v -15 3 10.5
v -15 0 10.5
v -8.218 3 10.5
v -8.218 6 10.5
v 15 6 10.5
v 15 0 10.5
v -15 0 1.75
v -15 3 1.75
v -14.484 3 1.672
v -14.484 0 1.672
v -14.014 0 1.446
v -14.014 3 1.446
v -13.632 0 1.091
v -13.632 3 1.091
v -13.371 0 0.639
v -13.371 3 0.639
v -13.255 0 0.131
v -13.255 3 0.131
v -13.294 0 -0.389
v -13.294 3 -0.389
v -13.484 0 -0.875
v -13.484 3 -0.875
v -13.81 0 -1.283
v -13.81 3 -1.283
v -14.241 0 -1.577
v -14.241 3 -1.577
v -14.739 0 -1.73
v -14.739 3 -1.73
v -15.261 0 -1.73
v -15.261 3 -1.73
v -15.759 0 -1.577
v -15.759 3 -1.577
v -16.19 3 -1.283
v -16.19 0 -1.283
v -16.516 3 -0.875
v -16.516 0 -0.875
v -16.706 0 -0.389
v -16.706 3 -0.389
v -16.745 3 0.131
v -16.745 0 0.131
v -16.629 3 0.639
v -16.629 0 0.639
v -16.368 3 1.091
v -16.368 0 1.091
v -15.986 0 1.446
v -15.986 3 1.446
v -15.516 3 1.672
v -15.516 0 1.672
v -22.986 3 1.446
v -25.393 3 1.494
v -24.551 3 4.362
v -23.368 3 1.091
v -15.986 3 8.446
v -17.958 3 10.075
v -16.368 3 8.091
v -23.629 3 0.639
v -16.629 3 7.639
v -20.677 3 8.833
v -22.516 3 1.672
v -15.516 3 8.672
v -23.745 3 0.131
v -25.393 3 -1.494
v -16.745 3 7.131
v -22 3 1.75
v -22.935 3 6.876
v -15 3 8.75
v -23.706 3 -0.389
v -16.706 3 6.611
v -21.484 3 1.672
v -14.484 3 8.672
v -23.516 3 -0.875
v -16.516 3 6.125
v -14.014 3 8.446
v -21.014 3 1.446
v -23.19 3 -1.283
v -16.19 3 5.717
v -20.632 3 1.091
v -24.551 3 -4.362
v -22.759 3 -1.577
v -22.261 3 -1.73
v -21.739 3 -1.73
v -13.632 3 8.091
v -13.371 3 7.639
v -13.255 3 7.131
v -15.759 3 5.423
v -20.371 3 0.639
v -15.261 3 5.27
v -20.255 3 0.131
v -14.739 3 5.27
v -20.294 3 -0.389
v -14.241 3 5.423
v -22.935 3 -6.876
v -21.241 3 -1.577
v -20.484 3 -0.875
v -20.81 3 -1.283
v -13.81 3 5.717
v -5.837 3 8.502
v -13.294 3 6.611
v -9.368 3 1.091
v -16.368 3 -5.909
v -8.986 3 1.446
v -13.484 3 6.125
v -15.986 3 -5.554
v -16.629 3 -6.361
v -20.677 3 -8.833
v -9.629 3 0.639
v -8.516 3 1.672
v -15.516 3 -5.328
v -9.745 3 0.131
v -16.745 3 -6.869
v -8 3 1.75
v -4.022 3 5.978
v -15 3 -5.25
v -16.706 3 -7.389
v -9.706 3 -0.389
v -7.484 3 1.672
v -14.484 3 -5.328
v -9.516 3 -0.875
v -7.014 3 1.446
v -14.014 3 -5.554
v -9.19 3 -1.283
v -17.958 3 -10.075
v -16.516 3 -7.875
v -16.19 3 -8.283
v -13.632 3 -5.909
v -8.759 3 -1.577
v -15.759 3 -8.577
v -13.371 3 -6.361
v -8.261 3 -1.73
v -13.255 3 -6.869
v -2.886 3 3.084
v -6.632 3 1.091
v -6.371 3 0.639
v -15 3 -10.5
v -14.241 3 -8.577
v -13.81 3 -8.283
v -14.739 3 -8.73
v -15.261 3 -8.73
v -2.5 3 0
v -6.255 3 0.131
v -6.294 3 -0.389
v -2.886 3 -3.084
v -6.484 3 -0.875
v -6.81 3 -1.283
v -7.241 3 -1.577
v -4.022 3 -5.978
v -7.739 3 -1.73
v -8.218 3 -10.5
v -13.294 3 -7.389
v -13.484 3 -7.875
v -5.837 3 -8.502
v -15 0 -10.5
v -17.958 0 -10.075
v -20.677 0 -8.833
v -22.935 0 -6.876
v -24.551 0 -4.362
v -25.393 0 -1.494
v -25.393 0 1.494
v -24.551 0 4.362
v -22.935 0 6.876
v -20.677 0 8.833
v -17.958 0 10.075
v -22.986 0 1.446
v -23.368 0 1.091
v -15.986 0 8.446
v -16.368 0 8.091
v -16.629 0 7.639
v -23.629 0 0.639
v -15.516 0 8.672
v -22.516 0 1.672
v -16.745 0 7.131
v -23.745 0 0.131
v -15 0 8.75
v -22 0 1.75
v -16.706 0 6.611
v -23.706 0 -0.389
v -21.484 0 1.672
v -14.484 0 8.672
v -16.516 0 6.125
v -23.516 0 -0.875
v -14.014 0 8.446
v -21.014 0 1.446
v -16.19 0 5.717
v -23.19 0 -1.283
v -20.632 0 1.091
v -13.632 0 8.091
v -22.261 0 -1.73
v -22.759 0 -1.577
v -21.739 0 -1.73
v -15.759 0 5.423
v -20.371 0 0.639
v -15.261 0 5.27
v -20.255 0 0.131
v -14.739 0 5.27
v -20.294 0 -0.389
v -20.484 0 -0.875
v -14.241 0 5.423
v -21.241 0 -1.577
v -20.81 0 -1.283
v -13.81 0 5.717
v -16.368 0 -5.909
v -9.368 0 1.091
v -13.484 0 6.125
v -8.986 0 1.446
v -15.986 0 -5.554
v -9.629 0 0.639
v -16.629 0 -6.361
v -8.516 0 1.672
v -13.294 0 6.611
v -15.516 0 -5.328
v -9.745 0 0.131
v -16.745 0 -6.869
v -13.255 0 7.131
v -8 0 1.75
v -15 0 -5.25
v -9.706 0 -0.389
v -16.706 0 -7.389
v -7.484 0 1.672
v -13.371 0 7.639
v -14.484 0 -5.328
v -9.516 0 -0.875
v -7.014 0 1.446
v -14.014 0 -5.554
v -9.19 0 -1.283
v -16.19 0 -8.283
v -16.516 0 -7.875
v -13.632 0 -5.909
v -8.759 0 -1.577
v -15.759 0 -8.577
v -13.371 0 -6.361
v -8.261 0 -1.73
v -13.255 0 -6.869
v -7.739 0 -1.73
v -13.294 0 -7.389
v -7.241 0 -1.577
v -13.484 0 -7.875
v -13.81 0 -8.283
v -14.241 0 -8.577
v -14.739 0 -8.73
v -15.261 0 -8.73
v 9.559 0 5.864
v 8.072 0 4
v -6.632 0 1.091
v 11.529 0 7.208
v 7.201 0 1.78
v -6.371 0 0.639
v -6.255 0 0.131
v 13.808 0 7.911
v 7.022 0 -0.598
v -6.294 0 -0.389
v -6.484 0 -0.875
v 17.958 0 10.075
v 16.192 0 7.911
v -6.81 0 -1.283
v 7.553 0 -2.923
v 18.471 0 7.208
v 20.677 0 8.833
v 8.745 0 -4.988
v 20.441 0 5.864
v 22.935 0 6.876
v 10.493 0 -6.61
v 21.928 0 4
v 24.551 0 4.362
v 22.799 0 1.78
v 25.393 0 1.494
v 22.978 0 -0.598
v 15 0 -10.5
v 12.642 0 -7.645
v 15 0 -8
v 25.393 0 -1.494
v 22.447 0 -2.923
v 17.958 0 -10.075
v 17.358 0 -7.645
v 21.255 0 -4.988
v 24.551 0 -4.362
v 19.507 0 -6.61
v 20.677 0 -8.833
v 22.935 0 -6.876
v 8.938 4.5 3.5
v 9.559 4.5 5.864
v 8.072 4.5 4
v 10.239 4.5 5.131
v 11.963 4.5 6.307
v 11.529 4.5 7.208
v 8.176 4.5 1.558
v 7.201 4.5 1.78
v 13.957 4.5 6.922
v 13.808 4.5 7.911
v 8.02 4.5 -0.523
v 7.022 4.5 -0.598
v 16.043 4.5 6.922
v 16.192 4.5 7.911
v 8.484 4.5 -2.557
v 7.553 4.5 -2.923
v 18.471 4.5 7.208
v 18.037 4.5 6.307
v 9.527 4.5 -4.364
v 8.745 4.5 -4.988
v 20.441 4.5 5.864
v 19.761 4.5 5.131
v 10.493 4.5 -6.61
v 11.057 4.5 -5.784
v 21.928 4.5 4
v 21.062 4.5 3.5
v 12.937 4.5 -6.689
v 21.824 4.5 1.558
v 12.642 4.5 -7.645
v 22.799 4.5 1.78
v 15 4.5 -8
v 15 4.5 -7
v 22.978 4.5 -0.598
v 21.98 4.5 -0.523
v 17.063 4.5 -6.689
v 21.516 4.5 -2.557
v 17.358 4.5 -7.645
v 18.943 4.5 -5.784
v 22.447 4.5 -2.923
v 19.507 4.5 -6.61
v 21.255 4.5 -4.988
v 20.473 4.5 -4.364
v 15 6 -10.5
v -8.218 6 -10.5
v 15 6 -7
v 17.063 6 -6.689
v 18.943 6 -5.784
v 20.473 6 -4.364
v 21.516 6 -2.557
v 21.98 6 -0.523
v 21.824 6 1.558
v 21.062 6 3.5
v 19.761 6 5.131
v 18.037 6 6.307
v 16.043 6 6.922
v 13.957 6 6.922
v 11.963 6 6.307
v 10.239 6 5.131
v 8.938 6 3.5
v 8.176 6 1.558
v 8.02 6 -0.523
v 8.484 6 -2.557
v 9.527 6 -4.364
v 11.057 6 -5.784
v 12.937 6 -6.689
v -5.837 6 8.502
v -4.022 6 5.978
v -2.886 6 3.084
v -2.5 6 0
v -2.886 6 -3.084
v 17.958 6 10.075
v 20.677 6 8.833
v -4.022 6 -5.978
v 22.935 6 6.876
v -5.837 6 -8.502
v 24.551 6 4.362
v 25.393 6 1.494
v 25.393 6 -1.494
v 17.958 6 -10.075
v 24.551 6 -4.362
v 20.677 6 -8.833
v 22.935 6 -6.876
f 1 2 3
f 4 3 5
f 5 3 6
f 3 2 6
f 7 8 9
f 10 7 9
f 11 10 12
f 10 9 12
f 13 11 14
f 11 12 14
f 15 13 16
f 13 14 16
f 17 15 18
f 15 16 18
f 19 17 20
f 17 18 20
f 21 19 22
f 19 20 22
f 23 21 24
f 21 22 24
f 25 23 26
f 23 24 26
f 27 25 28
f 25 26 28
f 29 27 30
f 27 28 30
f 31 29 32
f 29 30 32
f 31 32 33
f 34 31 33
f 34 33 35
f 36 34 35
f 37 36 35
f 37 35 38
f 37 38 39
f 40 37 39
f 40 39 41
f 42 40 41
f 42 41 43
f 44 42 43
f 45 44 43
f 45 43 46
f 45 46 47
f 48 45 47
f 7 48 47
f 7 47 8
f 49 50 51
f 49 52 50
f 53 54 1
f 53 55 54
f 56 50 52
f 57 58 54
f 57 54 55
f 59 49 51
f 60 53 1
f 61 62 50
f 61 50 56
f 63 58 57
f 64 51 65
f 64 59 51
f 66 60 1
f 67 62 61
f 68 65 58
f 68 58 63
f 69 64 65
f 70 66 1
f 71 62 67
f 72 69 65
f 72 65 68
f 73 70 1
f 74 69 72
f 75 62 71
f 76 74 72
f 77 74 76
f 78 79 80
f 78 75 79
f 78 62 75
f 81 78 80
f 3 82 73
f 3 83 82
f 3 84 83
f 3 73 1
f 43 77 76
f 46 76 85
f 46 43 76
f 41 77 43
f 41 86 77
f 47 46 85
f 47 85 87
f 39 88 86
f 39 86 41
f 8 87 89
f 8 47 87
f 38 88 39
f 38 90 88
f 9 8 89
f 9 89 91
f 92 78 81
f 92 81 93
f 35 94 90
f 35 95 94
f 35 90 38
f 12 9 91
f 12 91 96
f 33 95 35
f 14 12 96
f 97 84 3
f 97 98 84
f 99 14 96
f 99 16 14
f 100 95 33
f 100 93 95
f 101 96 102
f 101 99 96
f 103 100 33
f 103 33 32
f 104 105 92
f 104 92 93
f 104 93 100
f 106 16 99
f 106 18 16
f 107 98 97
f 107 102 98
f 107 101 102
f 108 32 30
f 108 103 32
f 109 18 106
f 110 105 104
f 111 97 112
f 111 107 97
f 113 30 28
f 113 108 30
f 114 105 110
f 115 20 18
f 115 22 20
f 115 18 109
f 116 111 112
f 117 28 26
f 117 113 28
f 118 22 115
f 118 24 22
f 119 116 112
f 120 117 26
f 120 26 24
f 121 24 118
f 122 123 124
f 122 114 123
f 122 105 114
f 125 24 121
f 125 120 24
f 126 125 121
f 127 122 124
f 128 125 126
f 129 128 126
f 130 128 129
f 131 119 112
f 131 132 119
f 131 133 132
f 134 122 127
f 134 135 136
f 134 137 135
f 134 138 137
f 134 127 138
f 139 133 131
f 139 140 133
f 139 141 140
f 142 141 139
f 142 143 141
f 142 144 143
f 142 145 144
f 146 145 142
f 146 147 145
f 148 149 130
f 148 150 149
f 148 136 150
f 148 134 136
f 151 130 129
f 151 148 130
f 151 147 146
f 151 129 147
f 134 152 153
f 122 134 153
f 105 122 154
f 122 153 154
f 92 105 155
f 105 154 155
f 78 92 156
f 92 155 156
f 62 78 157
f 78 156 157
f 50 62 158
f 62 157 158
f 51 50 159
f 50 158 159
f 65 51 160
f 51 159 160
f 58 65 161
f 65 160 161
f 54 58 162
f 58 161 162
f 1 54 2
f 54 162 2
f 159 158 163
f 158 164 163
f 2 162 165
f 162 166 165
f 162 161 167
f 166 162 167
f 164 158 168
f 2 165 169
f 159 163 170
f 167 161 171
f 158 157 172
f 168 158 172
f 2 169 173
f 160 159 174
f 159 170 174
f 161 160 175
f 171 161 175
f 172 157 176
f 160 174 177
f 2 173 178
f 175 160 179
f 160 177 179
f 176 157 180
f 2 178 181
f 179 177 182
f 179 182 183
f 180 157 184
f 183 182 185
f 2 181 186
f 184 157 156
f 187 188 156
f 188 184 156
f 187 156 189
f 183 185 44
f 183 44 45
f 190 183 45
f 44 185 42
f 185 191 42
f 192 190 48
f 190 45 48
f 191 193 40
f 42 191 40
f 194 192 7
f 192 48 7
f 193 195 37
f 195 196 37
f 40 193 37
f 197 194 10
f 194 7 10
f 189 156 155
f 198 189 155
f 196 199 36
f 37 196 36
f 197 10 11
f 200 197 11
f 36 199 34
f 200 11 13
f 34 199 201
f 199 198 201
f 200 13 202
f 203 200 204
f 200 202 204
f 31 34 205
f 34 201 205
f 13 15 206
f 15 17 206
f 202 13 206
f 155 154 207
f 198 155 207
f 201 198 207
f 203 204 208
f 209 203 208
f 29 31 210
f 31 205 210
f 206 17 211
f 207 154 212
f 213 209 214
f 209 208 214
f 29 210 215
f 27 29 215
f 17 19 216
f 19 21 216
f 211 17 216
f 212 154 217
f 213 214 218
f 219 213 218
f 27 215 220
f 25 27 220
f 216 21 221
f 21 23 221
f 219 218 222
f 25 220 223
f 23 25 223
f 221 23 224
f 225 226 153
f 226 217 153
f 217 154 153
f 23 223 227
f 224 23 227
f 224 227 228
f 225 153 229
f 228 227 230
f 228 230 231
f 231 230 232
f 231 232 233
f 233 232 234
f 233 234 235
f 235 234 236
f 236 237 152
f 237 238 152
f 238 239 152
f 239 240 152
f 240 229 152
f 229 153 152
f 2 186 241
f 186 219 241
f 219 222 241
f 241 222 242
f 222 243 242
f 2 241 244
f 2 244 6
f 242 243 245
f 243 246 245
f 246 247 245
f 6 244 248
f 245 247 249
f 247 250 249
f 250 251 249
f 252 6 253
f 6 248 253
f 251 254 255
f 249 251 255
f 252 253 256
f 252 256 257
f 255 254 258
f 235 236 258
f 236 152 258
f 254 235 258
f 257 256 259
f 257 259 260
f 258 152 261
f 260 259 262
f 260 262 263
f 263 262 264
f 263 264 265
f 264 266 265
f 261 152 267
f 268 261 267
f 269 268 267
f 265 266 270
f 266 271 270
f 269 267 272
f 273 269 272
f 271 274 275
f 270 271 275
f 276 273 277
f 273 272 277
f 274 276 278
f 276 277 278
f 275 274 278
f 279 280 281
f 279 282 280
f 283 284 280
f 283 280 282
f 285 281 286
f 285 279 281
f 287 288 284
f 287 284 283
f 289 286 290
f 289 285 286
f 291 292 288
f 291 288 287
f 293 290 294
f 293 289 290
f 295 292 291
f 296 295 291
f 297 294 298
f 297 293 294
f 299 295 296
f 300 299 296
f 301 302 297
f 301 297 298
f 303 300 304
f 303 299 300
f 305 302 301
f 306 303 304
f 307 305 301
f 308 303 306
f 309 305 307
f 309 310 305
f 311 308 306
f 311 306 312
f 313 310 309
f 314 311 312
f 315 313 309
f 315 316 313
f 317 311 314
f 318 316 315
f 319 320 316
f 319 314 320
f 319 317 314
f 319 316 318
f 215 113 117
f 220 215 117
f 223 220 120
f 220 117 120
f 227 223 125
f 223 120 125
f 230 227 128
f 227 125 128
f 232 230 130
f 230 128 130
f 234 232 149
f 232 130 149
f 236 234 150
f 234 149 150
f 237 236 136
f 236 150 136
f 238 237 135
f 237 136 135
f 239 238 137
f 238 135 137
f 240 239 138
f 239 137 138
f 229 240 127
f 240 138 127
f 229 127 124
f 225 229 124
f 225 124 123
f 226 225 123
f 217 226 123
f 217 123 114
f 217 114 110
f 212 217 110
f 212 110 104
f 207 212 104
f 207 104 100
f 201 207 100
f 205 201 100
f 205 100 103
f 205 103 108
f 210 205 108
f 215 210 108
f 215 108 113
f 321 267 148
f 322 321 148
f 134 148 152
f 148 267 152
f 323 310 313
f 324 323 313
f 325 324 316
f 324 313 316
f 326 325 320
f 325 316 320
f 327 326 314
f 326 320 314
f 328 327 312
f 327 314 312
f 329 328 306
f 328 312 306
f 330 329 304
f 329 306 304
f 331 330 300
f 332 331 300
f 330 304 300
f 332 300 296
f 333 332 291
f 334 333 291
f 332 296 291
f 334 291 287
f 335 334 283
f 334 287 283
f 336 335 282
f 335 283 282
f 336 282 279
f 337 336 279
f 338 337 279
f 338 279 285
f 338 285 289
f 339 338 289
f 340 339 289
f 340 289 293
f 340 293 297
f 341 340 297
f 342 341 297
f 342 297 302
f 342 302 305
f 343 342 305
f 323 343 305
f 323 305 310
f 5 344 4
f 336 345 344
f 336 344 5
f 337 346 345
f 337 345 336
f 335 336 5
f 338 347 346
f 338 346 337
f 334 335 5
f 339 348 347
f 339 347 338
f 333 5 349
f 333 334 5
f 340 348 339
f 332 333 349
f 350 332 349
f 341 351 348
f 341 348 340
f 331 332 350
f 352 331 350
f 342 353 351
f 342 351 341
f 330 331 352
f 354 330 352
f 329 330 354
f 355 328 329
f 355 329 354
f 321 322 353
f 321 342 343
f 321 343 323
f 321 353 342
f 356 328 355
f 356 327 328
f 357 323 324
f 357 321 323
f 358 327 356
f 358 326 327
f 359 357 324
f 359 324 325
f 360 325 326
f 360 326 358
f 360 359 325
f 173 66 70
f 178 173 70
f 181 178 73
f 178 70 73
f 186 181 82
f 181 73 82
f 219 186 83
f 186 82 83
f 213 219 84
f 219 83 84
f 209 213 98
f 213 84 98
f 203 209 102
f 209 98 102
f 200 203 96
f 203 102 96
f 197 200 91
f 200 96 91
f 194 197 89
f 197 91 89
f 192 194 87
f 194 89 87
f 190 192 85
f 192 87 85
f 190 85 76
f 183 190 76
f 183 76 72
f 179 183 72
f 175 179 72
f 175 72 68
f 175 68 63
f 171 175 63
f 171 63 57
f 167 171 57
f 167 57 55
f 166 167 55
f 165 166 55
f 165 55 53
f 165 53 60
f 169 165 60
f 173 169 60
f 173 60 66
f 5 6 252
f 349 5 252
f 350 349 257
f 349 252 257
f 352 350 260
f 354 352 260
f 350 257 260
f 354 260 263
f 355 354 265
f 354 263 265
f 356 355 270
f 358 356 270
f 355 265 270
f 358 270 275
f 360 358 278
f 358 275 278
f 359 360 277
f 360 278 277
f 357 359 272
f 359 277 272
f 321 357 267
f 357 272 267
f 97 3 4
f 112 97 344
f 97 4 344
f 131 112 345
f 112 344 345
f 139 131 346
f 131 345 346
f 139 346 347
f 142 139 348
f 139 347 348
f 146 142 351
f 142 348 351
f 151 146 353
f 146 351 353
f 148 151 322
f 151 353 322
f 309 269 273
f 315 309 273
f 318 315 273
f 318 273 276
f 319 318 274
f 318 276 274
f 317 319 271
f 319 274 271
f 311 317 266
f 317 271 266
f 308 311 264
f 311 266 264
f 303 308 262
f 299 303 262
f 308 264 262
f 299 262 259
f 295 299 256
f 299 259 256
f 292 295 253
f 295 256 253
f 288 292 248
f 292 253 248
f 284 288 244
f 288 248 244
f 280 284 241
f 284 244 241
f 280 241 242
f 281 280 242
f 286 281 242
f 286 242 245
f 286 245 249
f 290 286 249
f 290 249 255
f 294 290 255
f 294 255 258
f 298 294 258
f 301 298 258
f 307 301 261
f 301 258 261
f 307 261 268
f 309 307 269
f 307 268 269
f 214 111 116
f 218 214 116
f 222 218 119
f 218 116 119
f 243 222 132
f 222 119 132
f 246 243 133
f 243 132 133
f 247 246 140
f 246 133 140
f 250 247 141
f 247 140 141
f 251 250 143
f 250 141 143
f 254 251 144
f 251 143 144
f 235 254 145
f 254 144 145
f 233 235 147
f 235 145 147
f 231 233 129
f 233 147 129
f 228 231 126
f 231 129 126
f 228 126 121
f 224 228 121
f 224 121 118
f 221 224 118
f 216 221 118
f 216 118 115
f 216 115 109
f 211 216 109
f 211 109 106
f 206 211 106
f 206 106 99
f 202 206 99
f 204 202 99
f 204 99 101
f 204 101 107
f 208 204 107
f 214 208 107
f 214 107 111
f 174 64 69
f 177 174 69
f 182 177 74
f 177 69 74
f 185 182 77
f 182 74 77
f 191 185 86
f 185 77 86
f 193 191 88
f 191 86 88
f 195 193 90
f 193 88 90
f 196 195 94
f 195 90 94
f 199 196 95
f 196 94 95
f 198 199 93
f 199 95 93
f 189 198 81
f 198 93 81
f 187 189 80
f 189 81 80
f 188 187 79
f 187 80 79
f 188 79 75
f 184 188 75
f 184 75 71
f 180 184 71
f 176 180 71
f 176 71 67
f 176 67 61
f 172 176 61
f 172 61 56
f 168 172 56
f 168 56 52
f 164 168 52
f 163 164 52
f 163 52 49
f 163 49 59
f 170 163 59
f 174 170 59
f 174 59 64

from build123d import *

# Parameters (mm, degrees)
BOSS_EXTRUDE1_DEPTH     = 6
SKETCH4_R               = 1.75
SERVO_HORN_HOLES_DEPTH  = 29.222331583
SKETCH5_R               = 8
BEARING_PRESS_FIT_DEPTH = 4.5
SKETCH7_R               = 12.5
CUT_EXTRUDE1_DEPTH      = 3
SKETCH8_R               = 7
CUT_EXTRUDE2_DEPTH      = 28.941904015


with BuildPart() as part:
    # Sketch2 → Boss-Extrude1 (new body)
    with BuildSketch(Plane(origin=(0, 0, 0), x_dir=(1, 0, 0), z_dir=(0, 1, 0))):
        with BuildLine():
            Line((15, 10.5), (-15, 10.5))
            ThreePointArc((-15, 10.5), (-25.5, 0), (-15, -10.5))
            Line((-15, -10.5), (15, -10.5))
            ThreePointArc((15, -10.5), (25.5, 0), (15, 10.5))
        make_face()
    extrude(amount=BOSS_EXTRUDE1_DEPTH)

    # Sketch4 → Servo horn holes (cut, through all)
    with BuildSketch(Plane(origin=(0, 6, 0), x_dir=(1, 0, 0), z_dir=(0, 1, 0))):
        with Locations(Location((-15, 0, 0), (0, 0, 270))):
            Circle(SKETCH4_R)
        with Locations(Location((-8, 0, 0), (0, 0, 270))):
            Circle(SKETCH4_R)
        with Locations(Location((-15, -7, 0), (0, 0, 270))):
            Circle(SKETCH4_R)
        with Locations(Location((-22, 0, 0), (0, 0, 270))):
            Circle(SKETCH4_R)
        with Locations(Location((-15, 7, 0), (0, 0, 270))):
            Circle(SKETCH4_R)
    extrude(amount=-SERVO_HORN_HOLES_DEPTH, mode=Mode.SUBTRACT)

    # Sketch5 → Bearing press fit (cut)
    with BuildSketch(Plane(origin=(0, 0, 0), x_dir=(-1, 0, 0), z_dir=(0, -1, 0))):
        with Locations(Location((-15, 0, 0), (0, 0, 90))):
            Circle(SKETCH5_R)
    extrude(amount=-BEARING_PRESS_FIT_DEPTH, mode=Mode.SUBTRACT)

    # Sketch7 → Cut-Extrude1 (cut)
    with BuildSketch(Plane(origin=(0, 6, 0), x_dir=(1, 0, 0), z_dir=(0, 1, 0))):
        with Locations((-15, 0)):
            Circle(SKETCH7_R)
    extrude(amount=-CUT_EXTRUDE1_DEPTH, mode=Mode.SUBTRACT)

    # Sketch8 → Cut-Extrude2 (cut, through all)
    with BuildSketch(Plane.XZ.offset(-4.5)):
        with Locations(Location((15, 0, 0), (0, 0, 270))):
            Circle(SKETCH8_R)
    extrude(amount=-CUT_EXTRUDE2_DEPTH, mode=Mode.SUBTRACT)


solid = part.part
